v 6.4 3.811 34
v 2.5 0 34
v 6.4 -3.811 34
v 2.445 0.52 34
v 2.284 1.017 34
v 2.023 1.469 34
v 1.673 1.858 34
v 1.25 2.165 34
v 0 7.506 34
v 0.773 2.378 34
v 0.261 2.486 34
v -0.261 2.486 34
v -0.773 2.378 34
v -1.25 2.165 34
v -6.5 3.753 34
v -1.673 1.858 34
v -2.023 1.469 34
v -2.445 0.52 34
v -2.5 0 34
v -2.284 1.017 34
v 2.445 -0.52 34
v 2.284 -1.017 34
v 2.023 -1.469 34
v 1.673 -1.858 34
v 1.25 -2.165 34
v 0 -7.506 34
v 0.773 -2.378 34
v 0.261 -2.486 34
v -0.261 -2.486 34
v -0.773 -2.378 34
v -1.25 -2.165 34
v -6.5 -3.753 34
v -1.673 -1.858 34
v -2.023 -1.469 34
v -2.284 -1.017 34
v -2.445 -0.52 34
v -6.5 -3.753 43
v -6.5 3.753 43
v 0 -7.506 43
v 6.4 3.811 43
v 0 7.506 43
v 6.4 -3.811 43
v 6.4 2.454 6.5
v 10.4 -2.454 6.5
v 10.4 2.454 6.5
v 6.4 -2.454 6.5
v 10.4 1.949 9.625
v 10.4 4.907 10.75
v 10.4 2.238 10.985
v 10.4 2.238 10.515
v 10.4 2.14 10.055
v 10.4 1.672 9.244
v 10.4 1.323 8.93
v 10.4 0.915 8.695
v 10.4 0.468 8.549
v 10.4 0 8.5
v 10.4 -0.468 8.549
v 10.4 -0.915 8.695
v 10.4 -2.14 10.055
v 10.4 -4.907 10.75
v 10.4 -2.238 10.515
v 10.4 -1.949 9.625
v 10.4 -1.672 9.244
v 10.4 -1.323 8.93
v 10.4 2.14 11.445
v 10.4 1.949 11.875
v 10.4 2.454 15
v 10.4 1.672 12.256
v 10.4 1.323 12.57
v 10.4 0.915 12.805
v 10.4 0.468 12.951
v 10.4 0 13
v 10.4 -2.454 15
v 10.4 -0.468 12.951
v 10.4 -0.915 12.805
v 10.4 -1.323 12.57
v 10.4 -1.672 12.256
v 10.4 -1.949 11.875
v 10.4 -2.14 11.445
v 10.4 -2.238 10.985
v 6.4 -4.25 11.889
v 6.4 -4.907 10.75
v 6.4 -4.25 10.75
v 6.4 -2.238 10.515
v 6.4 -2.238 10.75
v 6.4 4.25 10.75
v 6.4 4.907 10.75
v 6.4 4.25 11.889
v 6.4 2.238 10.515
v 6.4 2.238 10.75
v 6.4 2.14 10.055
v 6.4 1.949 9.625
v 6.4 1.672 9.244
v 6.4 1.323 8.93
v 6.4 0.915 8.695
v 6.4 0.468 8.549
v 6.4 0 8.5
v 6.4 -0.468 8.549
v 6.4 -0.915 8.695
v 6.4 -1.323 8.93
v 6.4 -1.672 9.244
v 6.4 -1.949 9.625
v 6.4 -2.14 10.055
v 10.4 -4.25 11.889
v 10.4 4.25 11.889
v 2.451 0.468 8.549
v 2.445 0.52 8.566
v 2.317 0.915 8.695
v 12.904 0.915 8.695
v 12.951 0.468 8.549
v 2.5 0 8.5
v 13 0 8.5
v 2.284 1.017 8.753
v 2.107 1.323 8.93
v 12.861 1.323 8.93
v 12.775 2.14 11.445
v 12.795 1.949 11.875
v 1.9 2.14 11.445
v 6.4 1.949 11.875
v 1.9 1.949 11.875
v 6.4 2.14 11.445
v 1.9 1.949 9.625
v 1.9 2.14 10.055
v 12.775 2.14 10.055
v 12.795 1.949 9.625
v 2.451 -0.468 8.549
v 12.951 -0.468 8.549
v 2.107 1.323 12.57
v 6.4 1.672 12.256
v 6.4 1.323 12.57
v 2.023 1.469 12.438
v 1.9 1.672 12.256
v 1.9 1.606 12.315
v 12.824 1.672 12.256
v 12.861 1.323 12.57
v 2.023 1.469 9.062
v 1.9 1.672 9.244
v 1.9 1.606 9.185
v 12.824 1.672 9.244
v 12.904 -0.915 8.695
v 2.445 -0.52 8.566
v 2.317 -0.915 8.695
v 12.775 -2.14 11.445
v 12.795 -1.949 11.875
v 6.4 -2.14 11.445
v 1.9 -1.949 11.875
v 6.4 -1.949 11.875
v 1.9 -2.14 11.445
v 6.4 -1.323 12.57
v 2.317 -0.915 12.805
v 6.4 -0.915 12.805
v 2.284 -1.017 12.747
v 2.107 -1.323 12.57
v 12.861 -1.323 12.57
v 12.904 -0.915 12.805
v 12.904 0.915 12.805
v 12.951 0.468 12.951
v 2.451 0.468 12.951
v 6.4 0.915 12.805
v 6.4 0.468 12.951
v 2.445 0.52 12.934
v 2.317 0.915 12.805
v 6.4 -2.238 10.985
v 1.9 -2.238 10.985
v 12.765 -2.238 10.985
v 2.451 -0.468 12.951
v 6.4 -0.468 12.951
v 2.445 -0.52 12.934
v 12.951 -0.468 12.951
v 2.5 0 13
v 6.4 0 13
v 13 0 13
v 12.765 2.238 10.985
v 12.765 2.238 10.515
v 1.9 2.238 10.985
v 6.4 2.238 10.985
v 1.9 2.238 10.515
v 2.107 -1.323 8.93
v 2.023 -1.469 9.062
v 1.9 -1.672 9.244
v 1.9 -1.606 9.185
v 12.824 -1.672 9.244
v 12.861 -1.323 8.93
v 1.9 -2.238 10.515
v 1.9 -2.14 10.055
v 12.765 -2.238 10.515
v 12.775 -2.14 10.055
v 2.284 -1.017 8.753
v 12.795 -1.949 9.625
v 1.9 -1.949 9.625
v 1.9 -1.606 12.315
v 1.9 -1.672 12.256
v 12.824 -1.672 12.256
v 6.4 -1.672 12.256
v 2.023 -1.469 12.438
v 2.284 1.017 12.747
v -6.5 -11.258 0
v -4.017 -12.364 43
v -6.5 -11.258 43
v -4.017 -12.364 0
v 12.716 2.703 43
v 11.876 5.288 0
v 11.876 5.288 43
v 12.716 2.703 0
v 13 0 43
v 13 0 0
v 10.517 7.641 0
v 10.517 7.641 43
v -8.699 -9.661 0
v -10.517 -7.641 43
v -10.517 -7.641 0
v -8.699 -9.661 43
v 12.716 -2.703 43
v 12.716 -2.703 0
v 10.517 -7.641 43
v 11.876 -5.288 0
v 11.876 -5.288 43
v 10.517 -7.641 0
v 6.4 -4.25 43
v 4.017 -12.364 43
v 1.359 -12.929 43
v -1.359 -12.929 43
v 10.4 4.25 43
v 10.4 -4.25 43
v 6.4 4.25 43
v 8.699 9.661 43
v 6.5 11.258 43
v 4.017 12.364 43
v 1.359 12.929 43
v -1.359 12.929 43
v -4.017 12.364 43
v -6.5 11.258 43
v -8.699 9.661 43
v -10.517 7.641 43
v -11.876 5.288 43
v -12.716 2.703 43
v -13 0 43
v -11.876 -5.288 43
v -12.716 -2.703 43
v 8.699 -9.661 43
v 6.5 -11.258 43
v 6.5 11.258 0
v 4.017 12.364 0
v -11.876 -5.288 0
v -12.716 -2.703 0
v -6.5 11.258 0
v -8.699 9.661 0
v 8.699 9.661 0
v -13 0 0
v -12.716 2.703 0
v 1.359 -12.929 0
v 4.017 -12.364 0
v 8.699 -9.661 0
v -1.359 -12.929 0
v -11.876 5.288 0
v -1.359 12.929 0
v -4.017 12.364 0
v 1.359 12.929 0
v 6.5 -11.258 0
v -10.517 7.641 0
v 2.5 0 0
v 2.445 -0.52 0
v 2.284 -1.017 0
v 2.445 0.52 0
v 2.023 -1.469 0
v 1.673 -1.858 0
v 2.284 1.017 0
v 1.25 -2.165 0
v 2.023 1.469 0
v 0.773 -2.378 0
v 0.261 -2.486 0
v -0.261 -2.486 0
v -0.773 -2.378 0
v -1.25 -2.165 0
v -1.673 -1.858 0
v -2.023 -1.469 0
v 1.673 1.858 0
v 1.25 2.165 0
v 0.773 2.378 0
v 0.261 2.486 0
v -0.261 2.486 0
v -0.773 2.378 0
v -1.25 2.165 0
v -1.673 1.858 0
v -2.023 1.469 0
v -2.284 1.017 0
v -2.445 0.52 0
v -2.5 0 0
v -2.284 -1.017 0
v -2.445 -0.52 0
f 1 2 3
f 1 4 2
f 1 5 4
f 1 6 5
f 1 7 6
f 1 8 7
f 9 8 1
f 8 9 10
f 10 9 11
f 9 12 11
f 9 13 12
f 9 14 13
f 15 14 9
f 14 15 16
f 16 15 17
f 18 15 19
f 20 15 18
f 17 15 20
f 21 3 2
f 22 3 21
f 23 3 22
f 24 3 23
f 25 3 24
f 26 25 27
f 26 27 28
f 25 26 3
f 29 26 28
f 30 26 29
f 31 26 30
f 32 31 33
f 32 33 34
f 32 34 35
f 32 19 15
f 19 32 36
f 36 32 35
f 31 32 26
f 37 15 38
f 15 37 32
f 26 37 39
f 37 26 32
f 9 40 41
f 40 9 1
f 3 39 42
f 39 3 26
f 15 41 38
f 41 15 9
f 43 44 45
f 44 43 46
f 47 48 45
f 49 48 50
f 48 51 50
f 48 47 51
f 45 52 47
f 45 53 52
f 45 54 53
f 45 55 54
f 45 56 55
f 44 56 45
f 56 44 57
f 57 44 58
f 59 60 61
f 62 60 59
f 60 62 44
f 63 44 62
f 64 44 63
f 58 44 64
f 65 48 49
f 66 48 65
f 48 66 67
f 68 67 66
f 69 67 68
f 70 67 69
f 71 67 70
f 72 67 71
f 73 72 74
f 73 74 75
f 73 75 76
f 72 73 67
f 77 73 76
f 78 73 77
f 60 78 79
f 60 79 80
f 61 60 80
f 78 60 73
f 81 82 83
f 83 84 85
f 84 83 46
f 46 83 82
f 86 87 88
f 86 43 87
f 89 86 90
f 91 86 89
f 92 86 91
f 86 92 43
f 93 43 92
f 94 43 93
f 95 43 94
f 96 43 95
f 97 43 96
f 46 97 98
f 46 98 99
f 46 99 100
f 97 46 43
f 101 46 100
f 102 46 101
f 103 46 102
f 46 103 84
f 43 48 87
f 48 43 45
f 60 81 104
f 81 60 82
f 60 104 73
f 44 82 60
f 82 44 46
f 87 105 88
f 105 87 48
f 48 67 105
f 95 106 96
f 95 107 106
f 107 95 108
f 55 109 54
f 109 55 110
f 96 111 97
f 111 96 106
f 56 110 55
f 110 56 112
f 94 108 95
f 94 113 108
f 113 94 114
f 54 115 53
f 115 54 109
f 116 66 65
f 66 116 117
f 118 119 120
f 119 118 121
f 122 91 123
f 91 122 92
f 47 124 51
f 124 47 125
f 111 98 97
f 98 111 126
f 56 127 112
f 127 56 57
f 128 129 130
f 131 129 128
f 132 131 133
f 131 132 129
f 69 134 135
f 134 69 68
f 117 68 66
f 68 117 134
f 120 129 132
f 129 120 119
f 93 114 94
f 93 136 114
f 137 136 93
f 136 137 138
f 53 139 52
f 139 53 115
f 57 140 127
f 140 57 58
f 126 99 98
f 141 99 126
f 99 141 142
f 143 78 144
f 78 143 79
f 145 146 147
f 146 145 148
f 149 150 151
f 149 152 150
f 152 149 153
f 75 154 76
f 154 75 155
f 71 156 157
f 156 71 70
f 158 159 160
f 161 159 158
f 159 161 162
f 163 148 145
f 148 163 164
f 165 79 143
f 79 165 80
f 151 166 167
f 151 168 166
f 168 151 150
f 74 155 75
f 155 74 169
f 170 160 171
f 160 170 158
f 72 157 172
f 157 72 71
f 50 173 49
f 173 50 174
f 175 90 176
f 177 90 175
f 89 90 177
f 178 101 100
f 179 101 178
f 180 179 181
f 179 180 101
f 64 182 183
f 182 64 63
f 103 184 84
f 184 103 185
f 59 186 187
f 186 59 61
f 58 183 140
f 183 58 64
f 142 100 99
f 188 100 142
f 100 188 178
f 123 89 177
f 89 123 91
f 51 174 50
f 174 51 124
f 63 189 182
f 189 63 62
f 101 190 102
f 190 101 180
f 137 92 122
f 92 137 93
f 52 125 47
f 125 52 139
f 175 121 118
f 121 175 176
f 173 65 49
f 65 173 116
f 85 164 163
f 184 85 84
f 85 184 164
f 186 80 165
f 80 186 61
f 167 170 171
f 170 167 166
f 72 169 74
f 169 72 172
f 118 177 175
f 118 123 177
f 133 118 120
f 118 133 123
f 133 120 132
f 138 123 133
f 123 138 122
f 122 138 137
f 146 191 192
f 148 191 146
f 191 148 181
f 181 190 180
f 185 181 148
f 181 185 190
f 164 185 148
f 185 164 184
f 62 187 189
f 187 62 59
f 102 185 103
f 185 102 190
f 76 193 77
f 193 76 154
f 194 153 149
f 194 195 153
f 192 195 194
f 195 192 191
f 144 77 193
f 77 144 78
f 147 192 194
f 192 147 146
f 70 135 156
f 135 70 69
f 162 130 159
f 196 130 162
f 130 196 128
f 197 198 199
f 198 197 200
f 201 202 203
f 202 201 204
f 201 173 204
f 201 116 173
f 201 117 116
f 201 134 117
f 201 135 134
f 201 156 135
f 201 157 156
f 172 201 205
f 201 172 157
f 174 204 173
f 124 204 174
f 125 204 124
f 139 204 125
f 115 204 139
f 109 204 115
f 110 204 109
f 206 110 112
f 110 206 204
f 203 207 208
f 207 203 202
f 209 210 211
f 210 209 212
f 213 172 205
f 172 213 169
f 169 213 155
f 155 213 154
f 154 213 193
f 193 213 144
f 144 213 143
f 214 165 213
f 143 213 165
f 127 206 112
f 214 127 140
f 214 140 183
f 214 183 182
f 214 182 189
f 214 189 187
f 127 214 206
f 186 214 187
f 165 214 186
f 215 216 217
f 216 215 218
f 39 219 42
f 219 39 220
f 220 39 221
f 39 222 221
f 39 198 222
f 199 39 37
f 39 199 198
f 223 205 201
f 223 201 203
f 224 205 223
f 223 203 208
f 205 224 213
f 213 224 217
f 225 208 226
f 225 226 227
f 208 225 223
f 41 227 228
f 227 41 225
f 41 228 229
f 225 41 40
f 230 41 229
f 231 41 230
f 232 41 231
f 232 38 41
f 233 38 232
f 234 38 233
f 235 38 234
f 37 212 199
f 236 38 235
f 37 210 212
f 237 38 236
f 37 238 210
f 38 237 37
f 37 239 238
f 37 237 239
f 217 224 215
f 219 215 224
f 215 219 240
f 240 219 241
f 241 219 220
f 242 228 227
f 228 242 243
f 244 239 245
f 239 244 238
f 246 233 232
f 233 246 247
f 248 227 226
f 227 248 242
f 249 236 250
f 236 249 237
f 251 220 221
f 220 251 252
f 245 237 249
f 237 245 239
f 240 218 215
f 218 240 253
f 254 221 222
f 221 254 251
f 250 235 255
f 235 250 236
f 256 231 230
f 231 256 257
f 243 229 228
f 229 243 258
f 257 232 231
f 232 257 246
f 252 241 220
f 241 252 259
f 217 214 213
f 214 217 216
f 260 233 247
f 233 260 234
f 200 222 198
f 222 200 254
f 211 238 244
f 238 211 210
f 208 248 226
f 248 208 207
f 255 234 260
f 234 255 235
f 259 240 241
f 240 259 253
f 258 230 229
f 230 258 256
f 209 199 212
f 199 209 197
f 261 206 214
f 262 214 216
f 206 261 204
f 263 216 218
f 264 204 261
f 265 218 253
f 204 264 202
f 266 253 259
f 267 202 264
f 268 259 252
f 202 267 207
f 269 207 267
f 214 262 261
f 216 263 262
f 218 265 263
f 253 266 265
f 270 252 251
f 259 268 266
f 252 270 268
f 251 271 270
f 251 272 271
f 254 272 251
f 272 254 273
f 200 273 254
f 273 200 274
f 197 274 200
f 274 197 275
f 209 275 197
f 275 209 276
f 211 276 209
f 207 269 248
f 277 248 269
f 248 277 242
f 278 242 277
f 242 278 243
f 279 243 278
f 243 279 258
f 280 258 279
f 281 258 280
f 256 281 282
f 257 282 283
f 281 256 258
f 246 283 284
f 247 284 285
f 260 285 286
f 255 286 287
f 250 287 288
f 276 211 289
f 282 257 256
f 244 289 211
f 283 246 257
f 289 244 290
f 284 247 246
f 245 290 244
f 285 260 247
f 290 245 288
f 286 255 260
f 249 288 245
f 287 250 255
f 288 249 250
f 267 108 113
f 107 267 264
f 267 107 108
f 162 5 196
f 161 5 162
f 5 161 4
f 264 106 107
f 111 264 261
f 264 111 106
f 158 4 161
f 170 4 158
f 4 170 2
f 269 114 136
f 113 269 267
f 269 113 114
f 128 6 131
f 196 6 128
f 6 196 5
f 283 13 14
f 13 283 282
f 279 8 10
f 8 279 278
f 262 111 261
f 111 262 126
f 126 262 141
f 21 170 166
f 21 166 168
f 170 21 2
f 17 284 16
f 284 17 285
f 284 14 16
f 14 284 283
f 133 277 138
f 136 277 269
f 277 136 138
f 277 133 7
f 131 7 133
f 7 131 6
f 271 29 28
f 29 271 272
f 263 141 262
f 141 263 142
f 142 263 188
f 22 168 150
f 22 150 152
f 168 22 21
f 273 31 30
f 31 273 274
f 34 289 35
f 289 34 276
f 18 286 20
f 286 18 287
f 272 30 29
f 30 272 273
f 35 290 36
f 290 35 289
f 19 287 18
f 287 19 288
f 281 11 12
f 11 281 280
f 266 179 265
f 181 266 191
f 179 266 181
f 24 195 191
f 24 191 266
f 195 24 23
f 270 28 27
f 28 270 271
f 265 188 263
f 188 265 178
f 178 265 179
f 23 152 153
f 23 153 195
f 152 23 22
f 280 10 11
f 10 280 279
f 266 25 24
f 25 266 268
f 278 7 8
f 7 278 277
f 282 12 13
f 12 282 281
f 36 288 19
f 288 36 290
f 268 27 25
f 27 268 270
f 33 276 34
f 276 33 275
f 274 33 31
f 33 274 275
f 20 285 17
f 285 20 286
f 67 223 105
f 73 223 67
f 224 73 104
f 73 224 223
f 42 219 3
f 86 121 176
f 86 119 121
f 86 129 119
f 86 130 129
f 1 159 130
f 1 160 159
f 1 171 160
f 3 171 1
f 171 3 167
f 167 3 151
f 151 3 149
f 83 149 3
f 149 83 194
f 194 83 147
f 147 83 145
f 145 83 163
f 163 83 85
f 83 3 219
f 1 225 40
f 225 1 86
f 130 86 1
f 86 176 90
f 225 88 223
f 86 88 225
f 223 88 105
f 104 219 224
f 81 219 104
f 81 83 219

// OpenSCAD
// file: common.scad
/*--------------------------------------------------------------------------*
* Sizes and common routines for the CNC parts
*---------------------------------------------------------------------------*
* 13-Jul-2014 ShaneG
*
* First set of definitions using the components I have to experiment with.
*--------------------------------------------------------------------------*/

//---------------------------------------------------------------------------
// Common definitions
//---------------------------------------------------------------------------

RESOLUTION  = 0.1; // Resolution of your printer

PANEL_DEPTH = 4.0; // The prefered size of any shell material

BOLT_SIZE = 4.5; // Diameter of connecting bolts (M4)

GUIDE_ROD_DIAMETER = 12.50;

BEARING_DIAMETER       = 22.00;
BEARING_INNER_DIAMETER = 14.00;
BEARING_HEIGHT         = 7.00;

MOTOR_DEPTH          = 43;
MOTOR_WIDTH          = 43;
MOTOR_HEIGHT         = 40;
MOTOR_SHAFT_DIAMETER = 5.00;
MOTOR_SHAFT_LENGTH   = 25.00;

BED_TO_MOUNT = PANEL_DEPTH + (MOTOR_DEPTH / 2);

//---------------------------------------------------------------------------
// Nuts
//---------------------------------------------------------------------------

/* Hex Nut
**
** Dimensios for a hex nut. The 'outer' diameter (ie: straight side to
** parallel straight side) of the nut does not seem very consistent -
** measurements indicate a 0.5mm range of error across nuts.
*/

NUT_OUTER_DIAMETER = 13.00;
NUT_INNER_DIAMETER = 8.50;  // Enough room for the bore and thread
NUT_HEIGHT         = 6;

NUT4_OUTER_DIAMETER = 8.5;
NUT4_INNER_DIAMETER = 4.5;
NUT4_HEIGHT         = 4.0;

/** Create a hexagon.
 *
 * The 'length' parameter specifies the distance from the center of the
 * hexagon to the center of one of the six straight edges. The 'depth'
 * parameter specifies the size in the Z axis. The resulting object
 * is centered on the origin.
 */
module hexagon(length, depth = 2) {
  width = 2 * length * tan(30);
  union() {
    cube(size = [ length * 2, width, depth ], center = true);
    rotate(a = [ 0, 0, 60 ]) {
      cube(size = [ length * 2, width, depth ], center = true);
      }
    rotate(a = [ 0, 0, -60 ]) {
      cube(size = [ length * 2, width, depth ], center = true);
      }
    }
  }

/** Create a hex nut object
 *
 * This function creates a hex nut (centered on the origin) that contains a
 * hole through the center.
 */
module hexnut(depth = NUT_HEIGHT) {
  difference() {
    hexagon(NUT_OUTER_DIAMETER / 2, depth);
    cylinder(h = 2 * depth, r = NUT_INNER_DIAMETER / 2, center = true, $fs = RESOLUTION);
    }
  }

/** Create a negative hex nut object
 *
 * This function creates a hex nut (centered on the origin) that can be subtracted
 * from another shape to allow a hole for the nut to fit into.
 */
module hexnut_negative(depth = NUT_HEIGHT, spindle = NUT_HEIGHT) {
  union() {
    hexagon(NUT_OUTER_DIAMETER / 2, depth);
    cylinder(h = max(2 * depth, spindle), r = NUT_INNER_DIAMETER / 2, center = true, $fs = RESOLUTION);
    }
  }

/** Create a negative hex nut object
 *
 * This function creates a hex nut (centered on the origin) that can be subtracted
 * from another shape to allow a hole for the nut to fit into.
 */
module hexnut4_negative(depth = NUT4_HEIGHT, spindle = NUT4_HEIGHT) {
  union() {
    hexagon(NUT4_OUTER_DIAMETER / 2, depth);
    cylinder(h = max(2 * depth, spindle), r = NUT4_INNER_DIAMETER / 2, center = true, $fs = RESOLUTION);
    }
  }

//---------------------------------------------------------------------------
// Sizing for the stepper to rod link component. Needed as common because a
// couple of components require it to determine their sizing
//---------------------------------------------------------------------------

LINK_DIAMETER = NUT_OUTER_DIAMETER * 2;
LINK_LENGTH   = MOTOR_SHAFT_LENGTH + (3 * NUT_HEIGHT);
// main file
/*--------------------------------------------------------------------------*
* Connect the stepper shaft to the threaded rod
*---------------------------------------------------------------------------*
* 17-Jul-2014 ShaneG
*
* Links the stepper shaft to the threaded rod. Assumes a nylock nut on the
* shaft to grip to and uses a grub screw to bind to the stepper shaft.
*--------------------------------------------------------------------------*/
include <common.scad>;

difference() {
  // Create the main block
  translate(v = [ 0, 0, LINK_LENGTH / 2 ]) {
    cylinder(r = LINK_DIAMETER / 2, h = LINK_LENGTH, center = true, $fs = RESOLUTION);
    }
  // Cut out the hole for the stepper shaft
  cylinder(r = MOTOR_SHAFT_DIAMETER / 2, h = 3 * LINK_LENGTH, center = true, $fs = RESOLUTION);
  // Cut a hole for the nut
  translate(v = [ 0, 0, LINK_LENGTH ]) {
    hexagon(NUT_OUTER_DIAMETER / 2, 3 * NUT_HEIGHT);
    }
  // Cut a slot for the grub screw
  translate(v = [ (NUT_OUTER_DIAMETER / 2) - RESOLUTION, -NUT4_OUTER_DIAMETER / 2, LINK_LENGTH / 4 ]) {
    cube(size = [ NUT4_HEIGHT, NUT4_OUTER_DIAMETER, LINK_LENGTH * 2 ], center = false);
    }
  // Allow for the grub screw nut and bolt
  translate(v = [ (NUT_OUTER_DIAMETER / 2) - RESOLUTION + (NUT4_HEIGHT / 2), 0, LINK_LENGTH / 4 ]) {
    rotate(a = [ 0, 90, 0 ]) {
      hexnut4_negative(spindle = LINK_DIAMETER / 2);
      }
    }
  }

// Show some info
echo("Min grub screw length: ", (LINK_DIAMETER - MOTOR_SHAFT_DIAMETER) / 2);
